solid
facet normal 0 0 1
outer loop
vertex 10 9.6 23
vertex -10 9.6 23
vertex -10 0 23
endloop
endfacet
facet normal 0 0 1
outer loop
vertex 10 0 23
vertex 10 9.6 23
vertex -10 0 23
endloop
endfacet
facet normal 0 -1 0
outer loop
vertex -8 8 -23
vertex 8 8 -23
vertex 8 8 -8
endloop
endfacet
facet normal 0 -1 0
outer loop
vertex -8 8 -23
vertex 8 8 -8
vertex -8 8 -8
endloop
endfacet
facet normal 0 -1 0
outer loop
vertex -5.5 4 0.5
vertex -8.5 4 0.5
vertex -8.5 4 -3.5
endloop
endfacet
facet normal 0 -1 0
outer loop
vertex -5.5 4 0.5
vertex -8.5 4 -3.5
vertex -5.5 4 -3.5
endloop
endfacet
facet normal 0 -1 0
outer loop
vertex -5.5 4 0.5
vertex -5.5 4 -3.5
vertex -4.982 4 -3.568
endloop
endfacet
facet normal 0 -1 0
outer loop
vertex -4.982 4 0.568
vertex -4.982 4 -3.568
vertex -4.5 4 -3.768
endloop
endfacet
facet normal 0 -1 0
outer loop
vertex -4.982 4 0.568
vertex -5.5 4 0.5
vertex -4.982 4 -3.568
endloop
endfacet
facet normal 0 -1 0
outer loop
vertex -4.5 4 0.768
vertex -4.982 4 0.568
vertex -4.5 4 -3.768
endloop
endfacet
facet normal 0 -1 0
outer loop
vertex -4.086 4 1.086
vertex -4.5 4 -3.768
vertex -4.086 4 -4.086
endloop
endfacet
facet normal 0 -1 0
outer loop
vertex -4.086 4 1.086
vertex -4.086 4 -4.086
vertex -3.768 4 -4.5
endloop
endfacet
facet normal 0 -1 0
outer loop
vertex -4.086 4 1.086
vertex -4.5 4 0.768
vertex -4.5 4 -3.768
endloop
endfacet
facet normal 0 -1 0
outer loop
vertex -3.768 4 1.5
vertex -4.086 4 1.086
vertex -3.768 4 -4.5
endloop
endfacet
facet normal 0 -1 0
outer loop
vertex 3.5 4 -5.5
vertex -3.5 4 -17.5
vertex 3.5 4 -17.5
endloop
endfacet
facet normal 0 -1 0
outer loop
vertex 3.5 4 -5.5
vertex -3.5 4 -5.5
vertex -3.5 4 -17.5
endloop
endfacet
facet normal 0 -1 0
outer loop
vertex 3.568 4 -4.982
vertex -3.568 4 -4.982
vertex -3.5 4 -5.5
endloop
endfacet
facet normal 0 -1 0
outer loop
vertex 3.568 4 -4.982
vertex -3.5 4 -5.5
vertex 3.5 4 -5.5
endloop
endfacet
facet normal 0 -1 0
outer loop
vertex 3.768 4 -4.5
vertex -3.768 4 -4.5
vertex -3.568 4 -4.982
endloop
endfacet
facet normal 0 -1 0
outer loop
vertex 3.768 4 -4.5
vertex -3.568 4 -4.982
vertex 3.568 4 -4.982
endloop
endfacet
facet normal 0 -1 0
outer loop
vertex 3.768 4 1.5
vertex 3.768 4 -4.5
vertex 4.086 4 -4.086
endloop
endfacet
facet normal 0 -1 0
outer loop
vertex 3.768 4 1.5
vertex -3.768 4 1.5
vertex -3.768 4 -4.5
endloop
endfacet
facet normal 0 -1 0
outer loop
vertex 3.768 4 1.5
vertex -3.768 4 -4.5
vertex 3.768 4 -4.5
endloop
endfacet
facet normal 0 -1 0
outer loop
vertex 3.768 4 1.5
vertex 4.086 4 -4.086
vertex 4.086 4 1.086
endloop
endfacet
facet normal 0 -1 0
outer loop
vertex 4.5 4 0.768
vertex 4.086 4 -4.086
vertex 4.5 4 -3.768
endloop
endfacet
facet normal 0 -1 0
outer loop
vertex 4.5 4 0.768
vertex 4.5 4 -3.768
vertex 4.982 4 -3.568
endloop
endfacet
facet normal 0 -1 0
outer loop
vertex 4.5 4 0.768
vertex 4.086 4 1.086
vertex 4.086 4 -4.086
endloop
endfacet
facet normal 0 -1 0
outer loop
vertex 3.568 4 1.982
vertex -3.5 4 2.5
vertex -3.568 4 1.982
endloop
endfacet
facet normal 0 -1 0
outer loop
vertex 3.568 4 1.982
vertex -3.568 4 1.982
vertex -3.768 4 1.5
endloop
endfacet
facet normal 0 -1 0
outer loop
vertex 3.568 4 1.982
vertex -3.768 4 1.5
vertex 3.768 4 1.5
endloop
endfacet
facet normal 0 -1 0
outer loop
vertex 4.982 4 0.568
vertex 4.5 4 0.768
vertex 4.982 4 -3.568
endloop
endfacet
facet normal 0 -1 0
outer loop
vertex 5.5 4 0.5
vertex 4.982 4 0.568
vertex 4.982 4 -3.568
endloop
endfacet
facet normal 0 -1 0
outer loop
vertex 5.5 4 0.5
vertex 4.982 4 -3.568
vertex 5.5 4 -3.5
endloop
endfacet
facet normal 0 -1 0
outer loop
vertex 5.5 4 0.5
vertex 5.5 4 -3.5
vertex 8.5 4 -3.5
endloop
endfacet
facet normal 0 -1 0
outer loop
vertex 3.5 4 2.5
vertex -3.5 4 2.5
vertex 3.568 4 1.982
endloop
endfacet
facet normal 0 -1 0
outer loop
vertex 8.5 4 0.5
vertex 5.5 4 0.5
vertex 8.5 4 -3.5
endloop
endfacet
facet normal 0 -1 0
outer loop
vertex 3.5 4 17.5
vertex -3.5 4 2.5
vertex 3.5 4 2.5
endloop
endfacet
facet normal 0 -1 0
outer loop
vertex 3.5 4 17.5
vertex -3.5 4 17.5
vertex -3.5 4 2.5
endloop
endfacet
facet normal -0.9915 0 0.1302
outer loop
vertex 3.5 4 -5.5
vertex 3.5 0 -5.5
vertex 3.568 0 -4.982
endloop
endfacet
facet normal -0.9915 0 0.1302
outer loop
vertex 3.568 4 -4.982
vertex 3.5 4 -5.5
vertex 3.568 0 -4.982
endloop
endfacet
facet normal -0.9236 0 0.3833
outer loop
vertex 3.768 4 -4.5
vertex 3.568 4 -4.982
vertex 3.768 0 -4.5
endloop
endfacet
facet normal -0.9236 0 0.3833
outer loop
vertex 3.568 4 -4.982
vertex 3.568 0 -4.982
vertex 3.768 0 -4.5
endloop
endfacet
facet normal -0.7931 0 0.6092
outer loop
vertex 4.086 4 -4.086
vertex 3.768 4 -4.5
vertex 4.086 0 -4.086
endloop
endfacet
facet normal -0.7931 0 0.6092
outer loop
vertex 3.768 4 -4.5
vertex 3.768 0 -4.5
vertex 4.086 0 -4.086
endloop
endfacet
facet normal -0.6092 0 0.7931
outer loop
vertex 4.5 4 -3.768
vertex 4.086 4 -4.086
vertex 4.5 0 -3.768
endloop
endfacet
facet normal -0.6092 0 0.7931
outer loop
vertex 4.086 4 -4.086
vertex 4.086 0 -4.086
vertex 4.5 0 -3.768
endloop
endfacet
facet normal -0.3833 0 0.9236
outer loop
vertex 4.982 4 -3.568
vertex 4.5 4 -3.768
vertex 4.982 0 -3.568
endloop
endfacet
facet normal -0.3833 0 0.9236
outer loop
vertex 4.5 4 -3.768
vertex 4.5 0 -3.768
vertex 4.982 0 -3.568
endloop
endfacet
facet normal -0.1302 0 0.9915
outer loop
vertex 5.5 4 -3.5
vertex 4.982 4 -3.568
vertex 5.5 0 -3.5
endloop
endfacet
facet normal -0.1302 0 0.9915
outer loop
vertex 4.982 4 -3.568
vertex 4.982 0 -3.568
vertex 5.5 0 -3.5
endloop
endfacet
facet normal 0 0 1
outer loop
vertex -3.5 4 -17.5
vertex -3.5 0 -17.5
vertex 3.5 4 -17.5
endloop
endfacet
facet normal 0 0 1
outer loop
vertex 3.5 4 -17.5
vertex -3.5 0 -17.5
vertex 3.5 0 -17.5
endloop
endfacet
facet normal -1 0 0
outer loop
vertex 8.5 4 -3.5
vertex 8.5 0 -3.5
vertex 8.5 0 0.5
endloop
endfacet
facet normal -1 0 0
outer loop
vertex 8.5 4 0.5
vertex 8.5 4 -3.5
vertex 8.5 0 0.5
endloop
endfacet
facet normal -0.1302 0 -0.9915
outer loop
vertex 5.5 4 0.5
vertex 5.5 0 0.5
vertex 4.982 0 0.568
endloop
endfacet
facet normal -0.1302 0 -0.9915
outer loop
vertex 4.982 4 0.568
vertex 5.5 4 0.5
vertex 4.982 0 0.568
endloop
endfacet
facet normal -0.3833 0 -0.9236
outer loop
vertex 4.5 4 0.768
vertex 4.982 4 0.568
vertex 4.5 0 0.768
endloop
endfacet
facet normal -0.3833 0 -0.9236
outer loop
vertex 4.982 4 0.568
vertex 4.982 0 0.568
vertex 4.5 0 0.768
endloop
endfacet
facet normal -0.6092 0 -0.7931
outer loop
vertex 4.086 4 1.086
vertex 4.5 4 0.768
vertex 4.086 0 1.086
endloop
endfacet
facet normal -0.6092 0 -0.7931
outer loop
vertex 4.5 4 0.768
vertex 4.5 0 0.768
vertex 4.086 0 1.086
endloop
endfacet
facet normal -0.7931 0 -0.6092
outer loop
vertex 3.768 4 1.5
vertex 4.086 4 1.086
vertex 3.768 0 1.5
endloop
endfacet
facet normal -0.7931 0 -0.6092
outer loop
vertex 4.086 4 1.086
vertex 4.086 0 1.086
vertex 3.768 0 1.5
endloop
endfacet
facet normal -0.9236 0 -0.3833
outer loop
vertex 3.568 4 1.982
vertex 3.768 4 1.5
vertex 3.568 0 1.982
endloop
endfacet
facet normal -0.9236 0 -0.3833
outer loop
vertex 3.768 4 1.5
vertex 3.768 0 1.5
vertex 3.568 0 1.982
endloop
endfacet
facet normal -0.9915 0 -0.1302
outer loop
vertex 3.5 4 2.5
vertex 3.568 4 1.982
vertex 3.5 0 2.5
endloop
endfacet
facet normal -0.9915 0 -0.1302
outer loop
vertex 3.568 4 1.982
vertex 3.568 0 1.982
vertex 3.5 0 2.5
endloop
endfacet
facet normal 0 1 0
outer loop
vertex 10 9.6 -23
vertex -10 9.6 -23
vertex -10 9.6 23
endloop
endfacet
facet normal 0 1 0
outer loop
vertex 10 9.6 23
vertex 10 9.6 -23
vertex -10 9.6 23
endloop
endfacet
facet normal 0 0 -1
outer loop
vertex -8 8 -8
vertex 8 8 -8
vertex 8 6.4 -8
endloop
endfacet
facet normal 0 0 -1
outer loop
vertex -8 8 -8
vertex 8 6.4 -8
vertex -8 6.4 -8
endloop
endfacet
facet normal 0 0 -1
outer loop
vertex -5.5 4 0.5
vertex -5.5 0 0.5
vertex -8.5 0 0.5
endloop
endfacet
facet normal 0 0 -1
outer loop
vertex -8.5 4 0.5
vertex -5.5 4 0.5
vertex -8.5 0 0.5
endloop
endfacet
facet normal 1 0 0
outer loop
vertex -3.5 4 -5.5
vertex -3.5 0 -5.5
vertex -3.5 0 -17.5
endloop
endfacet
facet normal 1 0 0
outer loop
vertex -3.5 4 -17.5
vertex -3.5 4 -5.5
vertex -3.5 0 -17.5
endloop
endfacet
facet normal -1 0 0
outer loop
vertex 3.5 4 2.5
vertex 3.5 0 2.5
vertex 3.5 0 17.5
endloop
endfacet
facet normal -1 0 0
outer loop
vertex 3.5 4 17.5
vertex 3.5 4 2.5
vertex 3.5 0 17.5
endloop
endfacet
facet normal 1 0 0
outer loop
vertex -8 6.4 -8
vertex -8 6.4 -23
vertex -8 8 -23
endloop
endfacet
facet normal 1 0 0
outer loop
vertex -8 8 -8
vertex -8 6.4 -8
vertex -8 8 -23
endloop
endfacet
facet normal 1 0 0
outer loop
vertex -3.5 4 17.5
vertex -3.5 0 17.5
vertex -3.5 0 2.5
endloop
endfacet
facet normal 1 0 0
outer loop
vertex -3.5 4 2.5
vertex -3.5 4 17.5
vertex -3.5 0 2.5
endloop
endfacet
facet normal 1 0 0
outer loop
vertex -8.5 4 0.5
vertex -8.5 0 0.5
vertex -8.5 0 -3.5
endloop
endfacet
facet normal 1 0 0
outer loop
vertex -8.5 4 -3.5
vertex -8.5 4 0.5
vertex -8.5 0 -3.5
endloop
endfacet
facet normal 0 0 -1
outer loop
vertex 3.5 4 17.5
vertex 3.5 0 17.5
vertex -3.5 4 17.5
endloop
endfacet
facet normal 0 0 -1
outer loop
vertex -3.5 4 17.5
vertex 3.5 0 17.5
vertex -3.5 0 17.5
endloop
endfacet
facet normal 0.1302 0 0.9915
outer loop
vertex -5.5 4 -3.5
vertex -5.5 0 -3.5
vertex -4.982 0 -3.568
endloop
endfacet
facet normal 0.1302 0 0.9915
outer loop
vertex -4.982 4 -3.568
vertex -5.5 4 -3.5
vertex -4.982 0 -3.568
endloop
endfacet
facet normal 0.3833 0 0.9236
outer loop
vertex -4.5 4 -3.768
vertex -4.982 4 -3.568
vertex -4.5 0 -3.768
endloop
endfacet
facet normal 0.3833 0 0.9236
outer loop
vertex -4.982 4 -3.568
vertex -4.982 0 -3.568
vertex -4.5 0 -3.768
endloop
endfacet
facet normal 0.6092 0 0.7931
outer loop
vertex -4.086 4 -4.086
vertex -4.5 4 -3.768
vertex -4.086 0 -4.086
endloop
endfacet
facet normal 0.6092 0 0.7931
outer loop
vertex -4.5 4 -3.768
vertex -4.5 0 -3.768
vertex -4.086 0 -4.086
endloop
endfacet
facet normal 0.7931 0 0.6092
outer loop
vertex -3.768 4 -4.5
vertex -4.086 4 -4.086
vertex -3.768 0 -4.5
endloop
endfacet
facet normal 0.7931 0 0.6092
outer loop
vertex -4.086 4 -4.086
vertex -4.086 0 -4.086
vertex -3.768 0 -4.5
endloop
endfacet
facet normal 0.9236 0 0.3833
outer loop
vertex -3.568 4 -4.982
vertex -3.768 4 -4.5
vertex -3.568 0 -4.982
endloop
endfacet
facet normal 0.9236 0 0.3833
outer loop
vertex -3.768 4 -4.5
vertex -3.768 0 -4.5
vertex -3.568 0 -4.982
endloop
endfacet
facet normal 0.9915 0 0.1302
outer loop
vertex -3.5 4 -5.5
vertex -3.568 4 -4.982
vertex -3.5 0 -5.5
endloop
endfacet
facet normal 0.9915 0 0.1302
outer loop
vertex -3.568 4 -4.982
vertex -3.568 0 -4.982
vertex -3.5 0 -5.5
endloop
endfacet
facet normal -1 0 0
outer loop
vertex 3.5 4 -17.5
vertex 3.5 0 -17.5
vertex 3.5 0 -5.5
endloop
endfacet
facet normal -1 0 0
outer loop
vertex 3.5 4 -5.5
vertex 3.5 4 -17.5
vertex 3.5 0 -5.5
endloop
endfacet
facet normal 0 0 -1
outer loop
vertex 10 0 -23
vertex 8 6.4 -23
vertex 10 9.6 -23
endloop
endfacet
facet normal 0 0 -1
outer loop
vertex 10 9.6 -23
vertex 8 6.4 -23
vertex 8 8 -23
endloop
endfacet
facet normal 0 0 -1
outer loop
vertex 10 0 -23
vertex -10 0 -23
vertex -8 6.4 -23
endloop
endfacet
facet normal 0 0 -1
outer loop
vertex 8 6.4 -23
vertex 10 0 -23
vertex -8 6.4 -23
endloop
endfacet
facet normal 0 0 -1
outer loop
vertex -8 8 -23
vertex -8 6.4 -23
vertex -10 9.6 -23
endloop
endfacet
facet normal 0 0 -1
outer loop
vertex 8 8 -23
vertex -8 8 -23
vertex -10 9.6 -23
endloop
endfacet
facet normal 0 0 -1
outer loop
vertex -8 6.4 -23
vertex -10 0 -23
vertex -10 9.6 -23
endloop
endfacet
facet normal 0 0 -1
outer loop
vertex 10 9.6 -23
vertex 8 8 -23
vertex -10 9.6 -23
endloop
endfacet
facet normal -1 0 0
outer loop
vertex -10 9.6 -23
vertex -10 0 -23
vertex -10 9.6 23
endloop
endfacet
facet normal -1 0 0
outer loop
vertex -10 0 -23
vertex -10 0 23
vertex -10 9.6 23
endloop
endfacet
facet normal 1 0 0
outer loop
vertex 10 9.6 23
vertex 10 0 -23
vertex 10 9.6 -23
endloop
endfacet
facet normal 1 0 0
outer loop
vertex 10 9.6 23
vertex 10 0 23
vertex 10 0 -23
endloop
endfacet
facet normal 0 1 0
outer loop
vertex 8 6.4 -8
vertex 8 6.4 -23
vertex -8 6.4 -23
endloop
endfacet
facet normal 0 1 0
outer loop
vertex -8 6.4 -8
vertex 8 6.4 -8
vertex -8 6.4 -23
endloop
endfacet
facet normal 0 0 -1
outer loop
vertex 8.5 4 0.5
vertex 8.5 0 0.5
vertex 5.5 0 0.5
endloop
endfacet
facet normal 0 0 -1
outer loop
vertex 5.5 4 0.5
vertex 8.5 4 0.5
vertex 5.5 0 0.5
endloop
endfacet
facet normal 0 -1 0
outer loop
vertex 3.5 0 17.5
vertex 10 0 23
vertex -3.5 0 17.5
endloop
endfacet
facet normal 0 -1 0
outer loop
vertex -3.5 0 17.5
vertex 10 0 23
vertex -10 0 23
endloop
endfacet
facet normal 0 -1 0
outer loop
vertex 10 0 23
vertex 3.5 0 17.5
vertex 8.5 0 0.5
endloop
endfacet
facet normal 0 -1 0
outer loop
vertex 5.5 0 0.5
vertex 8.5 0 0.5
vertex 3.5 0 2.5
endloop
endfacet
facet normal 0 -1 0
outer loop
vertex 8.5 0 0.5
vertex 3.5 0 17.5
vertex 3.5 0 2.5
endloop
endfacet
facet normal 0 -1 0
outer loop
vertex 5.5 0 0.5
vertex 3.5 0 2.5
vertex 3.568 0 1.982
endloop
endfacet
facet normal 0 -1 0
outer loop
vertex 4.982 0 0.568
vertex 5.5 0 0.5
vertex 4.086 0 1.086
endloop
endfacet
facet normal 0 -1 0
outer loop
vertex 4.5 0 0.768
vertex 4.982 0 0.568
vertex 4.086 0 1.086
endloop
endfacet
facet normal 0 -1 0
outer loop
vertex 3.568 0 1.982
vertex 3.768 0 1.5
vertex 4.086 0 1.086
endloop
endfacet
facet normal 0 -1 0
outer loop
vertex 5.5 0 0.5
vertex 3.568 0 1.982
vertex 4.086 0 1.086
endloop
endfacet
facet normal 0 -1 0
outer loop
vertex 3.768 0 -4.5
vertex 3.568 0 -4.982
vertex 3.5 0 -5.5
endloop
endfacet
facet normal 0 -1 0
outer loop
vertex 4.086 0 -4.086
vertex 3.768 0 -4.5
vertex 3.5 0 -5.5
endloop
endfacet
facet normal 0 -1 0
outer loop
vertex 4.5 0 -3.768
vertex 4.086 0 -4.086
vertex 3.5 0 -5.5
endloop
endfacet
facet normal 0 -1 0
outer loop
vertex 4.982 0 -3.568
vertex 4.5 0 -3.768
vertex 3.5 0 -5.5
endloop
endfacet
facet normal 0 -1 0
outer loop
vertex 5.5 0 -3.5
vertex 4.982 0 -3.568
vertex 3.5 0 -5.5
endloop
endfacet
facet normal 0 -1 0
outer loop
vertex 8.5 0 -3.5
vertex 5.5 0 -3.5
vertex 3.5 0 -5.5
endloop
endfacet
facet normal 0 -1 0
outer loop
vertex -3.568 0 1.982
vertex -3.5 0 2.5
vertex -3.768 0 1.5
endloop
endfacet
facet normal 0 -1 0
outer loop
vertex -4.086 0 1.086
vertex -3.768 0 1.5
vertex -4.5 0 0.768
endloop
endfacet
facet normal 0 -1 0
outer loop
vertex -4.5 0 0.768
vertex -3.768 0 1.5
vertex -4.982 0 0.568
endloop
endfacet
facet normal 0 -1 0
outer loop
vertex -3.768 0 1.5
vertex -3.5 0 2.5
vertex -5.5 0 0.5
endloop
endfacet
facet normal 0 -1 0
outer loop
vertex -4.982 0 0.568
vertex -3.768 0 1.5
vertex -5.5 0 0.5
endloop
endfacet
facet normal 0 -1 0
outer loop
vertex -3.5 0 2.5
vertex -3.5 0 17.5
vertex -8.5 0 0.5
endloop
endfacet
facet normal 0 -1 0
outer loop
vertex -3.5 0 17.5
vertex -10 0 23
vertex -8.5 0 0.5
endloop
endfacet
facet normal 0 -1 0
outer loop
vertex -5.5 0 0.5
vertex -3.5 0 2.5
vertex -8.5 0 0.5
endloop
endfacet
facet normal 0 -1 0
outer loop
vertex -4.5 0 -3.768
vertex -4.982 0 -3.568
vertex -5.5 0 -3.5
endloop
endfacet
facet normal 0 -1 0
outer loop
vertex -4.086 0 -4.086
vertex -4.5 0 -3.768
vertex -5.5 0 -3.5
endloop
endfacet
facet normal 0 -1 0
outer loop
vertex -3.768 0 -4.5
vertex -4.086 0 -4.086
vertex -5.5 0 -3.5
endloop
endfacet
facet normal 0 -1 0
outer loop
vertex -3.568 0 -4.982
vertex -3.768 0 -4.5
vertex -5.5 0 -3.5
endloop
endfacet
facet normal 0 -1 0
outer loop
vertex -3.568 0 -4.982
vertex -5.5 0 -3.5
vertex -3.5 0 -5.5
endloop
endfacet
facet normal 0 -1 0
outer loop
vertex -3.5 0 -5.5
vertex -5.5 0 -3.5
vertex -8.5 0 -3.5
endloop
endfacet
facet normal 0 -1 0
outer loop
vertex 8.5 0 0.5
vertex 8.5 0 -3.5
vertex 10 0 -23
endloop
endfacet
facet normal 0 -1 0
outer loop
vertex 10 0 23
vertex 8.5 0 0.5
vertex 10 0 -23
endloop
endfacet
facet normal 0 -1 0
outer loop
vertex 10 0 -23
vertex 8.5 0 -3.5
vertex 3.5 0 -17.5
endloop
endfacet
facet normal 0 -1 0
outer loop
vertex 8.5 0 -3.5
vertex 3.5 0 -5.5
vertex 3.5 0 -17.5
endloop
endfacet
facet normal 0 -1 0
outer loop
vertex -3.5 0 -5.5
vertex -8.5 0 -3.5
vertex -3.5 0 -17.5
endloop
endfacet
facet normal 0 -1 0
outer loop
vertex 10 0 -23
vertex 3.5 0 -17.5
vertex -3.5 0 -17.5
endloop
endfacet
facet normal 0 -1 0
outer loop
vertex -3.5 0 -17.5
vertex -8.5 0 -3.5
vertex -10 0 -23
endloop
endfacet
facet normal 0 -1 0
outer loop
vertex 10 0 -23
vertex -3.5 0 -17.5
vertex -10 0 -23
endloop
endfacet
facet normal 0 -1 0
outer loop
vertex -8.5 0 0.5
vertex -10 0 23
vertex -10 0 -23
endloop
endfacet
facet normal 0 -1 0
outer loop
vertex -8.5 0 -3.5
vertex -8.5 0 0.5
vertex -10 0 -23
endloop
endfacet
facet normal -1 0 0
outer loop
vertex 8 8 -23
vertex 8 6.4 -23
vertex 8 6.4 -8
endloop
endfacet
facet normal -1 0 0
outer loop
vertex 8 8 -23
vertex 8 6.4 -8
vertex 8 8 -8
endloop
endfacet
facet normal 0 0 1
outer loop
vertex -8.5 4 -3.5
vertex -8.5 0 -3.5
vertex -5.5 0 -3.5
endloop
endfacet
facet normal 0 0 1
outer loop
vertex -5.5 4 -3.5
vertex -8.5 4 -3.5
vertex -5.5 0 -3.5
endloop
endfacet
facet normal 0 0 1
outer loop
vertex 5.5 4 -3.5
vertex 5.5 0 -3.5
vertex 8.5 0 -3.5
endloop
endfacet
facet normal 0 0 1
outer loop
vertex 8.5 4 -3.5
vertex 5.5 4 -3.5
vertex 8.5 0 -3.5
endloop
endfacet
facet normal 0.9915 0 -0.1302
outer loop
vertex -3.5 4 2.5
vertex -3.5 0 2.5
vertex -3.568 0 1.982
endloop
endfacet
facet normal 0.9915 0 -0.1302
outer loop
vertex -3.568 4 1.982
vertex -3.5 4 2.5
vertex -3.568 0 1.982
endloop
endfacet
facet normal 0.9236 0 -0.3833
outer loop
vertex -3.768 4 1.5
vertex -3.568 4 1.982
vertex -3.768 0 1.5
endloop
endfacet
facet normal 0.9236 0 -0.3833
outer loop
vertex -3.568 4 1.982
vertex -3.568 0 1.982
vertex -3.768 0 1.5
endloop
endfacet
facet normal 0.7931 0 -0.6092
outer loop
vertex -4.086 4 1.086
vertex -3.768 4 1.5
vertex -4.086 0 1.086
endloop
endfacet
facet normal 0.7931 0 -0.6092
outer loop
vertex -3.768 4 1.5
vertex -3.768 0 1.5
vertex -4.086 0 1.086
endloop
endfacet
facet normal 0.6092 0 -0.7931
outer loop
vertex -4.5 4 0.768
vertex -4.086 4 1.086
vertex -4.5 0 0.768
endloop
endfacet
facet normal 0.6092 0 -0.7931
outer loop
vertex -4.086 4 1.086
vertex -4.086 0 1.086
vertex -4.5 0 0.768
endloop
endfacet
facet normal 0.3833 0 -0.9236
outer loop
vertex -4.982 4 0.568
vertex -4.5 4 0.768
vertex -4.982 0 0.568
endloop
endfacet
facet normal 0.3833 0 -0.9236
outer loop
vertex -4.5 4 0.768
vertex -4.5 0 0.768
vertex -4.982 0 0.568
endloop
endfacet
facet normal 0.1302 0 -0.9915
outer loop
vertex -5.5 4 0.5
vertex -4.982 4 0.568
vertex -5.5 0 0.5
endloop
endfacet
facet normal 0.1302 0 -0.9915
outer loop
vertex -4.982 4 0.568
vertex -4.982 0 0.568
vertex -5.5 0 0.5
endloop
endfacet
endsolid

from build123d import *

# Parameters (mm, degrees)
SKETCH1_W           = 20
SKETCH1_H           = 42
BOSS_EXTRUDE1_DEPTH = 7.6
CUT_EXTRUDE1_DEPTH  = 4
THICKEN1_START      = -10
THICKEN1_DEPTH      = 20
SKETCH7_W           = 16
SKETCH7_H           = 1.6
CUT_EXTRUDE6_DEPTH  = 15


# Read off the part's stored shape, not the designer's step: Thicken1
with BuildPart() as part:
    # Sketch1 → Boss-Extrude1 (new body)
    with BuildSketch(Plane(origin=(0, 0, 0), x_dir=(1, 0, 0), z_dir=(0, 1, 0))):
        Rectangle(SKETCH1_W, SKETCH1_H)
    extrude(amount=BOSS_EXTRUDE1_DEPTH)

    # Sketch2 → Cut-Extrude1 (cut)
    with BuildSketch(Plane.XZ):
        with BuildLine():
            Line((-3.5, -17.5), (3.5, -17.5))
            Line((3.5, -17.5), (3.5, -5.5))
            ThreePointArc((3.5, -5.5), (4.085786438, -4.085786438), (5.5, -3.5))
            Line((5.5, -3.5), (8.5, -3.5))
            Line((8.5, -3.5), (8.5, 0.5))
            Line((8.5, 0.5), (5.5, 0.5))
            ThreePointArc((5.5, 0.5), (4.085786438, 1.085786438), (3.5, 2.5))
            Line((3.5, 2.5), (3.5, 17.5))
            Line((3.5, 17.5), (-3.5, 17.5))
            Line((-3.5, 17.5), (-3.5, 2.5))
            ThreePointArc((-3.5, 2.5), (-4.085786438, 1.085786438), (-5.5, 0.5))
            Line((-5.5, 0.5), (-8.5, 0.5))
            Line((-8.5, 0.5), (-8.5, -3.5))
            Line((-8.5, -3.5), (-5.5, -3.5))
            ThreePointArc((-5.5, -3.5), (-4.085786438, -4.085786438), (-3.5, -5.5))
            Line((-3.5, -5.5), (-3.5, -17.5))
        make_face()
    extrude(amount=-CUT_EXTRUDE1_DEPTH, mode=Mode.SUBTRACT)

    # Thicken1 outline → Thicken1 (add)
    with BuildSketch(Plane.YZ.offset(THICKEN1_START)):
        Polygon((0, -23), (9.6, -23), (9.6, 23), (0, 23), (0, 21), (7.6, 21), (7.6, -21), (0, -21), align=None)
    extrude(amount=THICKEN1_DEPTH)

    # Sketch7 → Cut-Extrude6 (cut)
    with BuildSketch(Plane(origin=(0, 0, -23), x_dir=(-1, 0, 0), z_dir=(0, 0, -1))):
        with Locations((0, 7.2)):
            Rectangle(SKETCH7_W, SKETCH7_H)
    extrude(amount=-CUT_EXTRUDE6_DEPTH, mode=Mode.SUBTRACT)


solid = part.part
